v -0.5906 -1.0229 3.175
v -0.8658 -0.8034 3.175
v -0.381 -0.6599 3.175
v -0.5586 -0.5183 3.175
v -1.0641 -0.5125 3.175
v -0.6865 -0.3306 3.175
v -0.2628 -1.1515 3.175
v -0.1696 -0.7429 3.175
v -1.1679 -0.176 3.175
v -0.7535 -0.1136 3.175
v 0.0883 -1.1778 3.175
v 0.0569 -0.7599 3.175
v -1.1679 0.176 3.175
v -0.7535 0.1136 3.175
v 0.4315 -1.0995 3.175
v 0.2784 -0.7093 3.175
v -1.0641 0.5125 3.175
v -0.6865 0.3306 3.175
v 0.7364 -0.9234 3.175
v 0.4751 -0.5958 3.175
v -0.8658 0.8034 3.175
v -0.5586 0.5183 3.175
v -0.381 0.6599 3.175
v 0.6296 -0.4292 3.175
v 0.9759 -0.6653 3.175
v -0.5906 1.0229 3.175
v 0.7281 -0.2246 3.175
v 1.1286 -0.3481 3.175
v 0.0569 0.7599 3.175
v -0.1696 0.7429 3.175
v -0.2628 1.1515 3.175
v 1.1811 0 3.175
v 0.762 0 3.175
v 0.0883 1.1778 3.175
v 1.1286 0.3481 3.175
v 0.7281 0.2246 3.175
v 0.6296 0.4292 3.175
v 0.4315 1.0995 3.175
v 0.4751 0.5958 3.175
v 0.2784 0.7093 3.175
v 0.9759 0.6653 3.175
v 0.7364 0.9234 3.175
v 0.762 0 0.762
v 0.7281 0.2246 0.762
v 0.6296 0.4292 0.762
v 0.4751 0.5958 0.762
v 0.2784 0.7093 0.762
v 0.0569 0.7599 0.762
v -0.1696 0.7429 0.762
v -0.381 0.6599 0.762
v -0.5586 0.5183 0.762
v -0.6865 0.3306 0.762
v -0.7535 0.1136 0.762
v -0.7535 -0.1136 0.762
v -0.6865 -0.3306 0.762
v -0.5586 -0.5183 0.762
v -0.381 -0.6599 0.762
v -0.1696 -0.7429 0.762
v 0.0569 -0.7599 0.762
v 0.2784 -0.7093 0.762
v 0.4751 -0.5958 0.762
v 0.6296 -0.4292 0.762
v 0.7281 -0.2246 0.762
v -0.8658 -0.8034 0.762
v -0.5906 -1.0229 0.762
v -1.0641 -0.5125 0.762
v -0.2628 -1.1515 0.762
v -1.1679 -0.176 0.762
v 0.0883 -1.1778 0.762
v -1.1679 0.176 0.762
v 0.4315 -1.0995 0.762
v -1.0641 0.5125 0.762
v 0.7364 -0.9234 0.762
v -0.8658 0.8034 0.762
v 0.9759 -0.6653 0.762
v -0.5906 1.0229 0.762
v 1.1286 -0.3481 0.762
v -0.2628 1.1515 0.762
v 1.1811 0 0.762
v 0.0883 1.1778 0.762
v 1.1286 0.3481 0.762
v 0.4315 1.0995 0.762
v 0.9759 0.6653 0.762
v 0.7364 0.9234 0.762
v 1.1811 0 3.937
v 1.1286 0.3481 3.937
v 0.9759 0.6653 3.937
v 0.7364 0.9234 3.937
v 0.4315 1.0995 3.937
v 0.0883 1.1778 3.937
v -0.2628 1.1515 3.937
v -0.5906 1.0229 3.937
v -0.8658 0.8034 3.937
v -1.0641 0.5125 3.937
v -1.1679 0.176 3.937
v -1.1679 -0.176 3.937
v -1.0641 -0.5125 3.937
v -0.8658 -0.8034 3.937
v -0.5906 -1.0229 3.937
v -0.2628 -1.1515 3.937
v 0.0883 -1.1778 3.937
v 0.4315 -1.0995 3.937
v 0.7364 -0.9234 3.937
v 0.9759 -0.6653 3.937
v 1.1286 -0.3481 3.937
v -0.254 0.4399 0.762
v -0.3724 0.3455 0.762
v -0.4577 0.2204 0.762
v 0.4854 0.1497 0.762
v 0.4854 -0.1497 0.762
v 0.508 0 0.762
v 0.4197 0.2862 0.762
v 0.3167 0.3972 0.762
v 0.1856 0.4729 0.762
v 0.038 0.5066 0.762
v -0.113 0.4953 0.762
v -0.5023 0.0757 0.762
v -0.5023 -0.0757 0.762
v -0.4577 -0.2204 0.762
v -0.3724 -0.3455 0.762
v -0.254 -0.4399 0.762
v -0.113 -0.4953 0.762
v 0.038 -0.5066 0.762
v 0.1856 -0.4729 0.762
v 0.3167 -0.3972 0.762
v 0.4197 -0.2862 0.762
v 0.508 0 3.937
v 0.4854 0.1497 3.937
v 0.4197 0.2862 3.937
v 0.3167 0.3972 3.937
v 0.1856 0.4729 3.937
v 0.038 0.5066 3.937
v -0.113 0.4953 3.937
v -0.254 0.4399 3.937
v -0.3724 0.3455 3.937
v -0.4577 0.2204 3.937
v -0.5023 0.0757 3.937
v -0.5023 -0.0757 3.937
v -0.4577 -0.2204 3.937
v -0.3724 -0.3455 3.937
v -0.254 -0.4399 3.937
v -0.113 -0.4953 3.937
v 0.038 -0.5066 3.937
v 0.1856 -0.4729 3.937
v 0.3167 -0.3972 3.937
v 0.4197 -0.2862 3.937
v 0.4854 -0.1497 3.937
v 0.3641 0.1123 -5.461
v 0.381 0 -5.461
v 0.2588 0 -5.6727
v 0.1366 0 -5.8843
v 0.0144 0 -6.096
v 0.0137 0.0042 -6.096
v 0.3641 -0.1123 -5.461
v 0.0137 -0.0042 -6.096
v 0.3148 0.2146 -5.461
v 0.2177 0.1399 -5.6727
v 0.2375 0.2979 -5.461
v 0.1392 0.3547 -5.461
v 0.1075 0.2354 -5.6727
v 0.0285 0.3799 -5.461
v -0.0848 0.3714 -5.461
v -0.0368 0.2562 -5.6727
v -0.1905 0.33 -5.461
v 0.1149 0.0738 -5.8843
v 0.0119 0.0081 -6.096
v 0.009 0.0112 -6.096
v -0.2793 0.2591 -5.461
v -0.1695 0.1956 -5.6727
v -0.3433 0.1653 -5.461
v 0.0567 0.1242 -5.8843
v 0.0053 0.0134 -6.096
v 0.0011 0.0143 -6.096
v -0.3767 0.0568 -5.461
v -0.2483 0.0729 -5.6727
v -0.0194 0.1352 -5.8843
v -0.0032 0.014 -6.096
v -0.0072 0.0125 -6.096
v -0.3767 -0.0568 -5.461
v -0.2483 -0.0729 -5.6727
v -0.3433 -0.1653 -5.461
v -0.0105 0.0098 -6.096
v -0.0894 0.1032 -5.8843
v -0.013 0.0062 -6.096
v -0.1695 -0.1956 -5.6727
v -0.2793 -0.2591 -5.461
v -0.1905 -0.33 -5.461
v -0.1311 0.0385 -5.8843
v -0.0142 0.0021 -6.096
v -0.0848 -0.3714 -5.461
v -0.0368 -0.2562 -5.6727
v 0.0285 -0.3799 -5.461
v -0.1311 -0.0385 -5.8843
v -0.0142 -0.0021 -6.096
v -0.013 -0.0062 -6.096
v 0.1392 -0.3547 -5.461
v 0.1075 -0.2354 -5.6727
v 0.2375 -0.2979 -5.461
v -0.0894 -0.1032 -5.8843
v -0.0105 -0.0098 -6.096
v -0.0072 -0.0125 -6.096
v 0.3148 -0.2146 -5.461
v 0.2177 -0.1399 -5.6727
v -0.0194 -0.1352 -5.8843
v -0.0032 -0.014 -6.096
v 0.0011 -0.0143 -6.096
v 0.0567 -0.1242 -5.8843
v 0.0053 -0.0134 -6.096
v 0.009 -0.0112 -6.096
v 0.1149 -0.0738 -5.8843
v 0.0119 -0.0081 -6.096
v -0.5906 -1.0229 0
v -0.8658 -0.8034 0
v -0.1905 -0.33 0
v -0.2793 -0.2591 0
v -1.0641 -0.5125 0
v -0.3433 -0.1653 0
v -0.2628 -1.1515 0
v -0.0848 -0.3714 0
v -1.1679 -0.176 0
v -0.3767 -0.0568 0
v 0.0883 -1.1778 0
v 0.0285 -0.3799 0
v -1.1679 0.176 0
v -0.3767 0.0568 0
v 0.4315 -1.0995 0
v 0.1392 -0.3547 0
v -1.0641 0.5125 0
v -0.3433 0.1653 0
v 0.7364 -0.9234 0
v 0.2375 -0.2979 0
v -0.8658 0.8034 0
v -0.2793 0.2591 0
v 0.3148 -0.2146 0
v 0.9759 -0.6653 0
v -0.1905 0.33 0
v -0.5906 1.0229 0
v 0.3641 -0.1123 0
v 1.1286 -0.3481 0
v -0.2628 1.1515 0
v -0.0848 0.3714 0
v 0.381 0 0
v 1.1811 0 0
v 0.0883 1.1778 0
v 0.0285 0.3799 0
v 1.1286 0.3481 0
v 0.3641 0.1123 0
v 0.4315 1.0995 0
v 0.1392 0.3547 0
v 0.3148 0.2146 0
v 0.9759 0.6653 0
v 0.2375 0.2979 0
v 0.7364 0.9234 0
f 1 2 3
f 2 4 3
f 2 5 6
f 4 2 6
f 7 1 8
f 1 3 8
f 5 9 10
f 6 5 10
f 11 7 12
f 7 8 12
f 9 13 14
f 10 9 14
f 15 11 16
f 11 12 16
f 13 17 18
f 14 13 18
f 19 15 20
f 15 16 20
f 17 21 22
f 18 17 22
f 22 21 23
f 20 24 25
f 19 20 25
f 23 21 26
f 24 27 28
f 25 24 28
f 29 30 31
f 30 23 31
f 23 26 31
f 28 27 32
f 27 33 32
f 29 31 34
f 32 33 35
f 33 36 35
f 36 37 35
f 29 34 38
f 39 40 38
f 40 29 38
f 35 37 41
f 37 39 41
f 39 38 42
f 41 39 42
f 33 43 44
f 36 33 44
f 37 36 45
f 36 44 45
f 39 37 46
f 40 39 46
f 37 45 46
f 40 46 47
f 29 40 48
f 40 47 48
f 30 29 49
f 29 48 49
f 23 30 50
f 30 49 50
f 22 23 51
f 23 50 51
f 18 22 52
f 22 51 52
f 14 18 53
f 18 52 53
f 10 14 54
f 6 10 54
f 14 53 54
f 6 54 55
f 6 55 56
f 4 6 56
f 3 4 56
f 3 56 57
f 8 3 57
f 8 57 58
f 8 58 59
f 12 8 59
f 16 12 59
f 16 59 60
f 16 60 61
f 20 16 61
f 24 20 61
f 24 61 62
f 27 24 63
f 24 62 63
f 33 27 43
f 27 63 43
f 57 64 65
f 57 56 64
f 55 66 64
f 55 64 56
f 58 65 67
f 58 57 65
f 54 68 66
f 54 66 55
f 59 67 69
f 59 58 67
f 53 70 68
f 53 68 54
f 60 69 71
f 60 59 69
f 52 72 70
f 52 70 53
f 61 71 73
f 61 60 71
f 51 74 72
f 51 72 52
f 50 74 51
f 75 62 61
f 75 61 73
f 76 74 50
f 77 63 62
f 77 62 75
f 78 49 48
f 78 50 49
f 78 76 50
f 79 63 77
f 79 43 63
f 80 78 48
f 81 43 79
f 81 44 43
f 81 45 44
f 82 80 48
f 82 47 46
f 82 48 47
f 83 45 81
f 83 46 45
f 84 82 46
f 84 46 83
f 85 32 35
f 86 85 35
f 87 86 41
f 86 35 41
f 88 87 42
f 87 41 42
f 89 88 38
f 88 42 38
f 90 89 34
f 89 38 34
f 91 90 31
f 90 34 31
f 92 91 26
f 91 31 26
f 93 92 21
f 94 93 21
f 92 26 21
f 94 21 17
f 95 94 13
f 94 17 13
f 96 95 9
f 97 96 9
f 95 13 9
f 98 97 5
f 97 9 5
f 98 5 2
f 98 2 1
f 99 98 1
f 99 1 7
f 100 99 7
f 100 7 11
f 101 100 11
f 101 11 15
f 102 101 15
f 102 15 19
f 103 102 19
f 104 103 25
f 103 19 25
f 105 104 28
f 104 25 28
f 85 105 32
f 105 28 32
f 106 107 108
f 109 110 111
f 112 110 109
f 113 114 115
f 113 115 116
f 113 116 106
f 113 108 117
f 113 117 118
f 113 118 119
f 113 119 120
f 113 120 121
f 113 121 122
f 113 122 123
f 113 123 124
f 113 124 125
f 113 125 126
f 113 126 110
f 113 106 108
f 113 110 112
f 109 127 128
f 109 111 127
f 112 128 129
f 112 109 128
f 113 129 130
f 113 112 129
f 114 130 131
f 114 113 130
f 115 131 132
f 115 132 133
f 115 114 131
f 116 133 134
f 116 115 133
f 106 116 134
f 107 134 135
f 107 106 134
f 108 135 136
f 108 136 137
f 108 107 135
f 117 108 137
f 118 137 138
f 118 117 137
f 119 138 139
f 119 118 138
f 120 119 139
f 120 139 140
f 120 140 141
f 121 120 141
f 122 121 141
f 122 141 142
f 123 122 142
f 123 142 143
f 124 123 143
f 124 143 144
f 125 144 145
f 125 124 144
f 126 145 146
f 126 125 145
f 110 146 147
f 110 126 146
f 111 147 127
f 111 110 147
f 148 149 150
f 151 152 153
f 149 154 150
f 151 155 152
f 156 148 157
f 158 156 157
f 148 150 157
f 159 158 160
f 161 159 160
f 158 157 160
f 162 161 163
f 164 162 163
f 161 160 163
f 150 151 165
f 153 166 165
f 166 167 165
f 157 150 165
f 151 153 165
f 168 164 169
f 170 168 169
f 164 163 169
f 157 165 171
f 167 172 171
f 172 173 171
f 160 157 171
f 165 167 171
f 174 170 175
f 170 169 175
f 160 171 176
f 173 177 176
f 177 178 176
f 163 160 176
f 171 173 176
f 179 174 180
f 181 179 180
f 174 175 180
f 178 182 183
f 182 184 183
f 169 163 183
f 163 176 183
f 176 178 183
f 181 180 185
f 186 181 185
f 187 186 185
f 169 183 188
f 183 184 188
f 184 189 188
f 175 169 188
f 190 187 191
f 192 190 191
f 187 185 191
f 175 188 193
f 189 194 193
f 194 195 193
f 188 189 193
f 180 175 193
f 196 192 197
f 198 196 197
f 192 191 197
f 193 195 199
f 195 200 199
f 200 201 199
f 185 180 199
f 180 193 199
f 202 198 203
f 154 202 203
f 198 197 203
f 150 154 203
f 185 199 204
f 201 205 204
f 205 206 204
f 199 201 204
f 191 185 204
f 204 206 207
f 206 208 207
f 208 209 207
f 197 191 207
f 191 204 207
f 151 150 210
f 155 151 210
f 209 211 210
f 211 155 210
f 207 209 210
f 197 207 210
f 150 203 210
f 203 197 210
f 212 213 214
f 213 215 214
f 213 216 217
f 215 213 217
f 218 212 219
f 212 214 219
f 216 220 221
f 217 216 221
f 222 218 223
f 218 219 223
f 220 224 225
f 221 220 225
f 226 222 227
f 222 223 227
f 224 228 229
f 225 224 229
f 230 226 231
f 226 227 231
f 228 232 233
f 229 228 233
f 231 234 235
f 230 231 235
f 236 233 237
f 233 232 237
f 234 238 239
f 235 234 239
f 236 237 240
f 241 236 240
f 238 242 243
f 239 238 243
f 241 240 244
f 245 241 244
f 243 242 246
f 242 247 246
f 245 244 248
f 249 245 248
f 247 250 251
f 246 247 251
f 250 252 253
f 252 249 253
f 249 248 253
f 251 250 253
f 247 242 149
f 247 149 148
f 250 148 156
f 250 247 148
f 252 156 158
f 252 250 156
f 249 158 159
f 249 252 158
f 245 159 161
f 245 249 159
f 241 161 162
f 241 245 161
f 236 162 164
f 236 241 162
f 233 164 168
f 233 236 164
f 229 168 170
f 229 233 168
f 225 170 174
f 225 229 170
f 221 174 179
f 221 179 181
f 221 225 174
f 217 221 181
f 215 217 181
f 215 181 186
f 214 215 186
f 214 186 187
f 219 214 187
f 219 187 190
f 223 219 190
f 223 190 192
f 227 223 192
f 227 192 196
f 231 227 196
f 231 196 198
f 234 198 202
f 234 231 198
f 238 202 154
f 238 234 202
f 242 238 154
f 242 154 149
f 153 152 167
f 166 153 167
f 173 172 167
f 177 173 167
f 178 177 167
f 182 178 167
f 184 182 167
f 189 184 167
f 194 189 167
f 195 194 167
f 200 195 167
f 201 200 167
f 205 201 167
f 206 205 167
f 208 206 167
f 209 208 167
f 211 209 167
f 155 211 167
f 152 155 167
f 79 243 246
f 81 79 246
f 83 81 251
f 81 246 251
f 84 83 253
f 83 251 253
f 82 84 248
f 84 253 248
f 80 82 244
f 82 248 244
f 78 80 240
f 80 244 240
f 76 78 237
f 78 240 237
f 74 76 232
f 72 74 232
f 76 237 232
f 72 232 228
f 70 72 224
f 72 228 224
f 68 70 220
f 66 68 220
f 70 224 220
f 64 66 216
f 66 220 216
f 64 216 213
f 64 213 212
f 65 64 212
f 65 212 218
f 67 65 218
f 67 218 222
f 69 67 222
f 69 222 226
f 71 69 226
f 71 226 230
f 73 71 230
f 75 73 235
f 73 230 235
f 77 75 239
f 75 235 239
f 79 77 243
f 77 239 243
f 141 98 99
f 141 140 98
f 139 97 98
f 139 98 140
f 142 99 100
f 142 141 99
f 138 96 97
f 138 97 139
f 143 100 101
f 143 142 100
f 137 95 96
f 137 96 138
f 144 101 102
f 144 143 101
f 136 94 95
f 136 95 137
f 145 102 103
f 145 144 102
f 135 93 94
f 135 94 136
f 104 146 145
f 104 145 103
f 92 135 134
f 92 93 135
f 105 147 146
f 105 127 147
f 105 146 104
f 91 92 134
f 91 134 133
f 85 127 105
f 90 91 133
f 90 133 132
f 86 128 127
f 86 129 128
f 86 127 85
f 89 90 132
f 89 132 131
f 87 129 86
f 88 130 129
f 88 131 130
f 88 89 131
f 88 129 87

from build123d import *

# Parameters (mm, degrees)
F0_R      = 0.381
F1_DEPTH  = 6.096
F2_SIZE2  = 0.3666174209
F2_SIZE   = 0.635
F0_R_2    = 1.1811
F1_FACE_R = 0.381
F3_DEPTH  = 0.762
F4_R      = 0.762
F4_R_2    = 0.508
F5_DEPTH  = 2.413
F6_R      = 1.1811
F6_R_2    = 0.762
F6_R_3    = 0.508
F7_DEPTH  = 0.762


with BuildPart() as f1:
    # F0 (on Top) → F1 (new body)
    with BuildSketch(Plane.XY):
        Circle(F0_R)
    extrude(amount=-F1_DEPTH)

    # F2
    f2_edges = [f1.edges().sort_by_distance(p)[0] for p in [
        (-0.381, 0, -6.096),
    ]]
    f2_side = f1.faces().sort_by_distance((-0.381, 0, -3.048))[0]
    chamfer(f2_edges, length=F2_SIZE, length2=F2_SIZE2, reference=f2_side)

    # F0 (on Top) + F1_face (on face) → F3 (join)
    with BuildSketch(Plane.XY):
        Circle(F0_R_2)
        Circle(F0_R, mode=Mode.SUBTRACT)
    with BuildSketch(Plane.XY):
        Circle(F1_FACE_R)
    extrude(amount=F3_DEPTH)

    # F4 (on face) → F5 (join)
    with BuildSketch(Plane.XY.offset(0.762)):
        Circle(F4_R)
        Circle(F4_R_2, mode=Mode.SUBTRACT)
    extrude(amount=F5_DEPTH)

    # F6 (on face) → F7 (join)
    with BuildSketch(Plane.XY.offset(3.175)):
        Circle(F6_R)
        Circle(F6_R_2, mode=Mode.SUBTRACT)
        Circle(F6_R_2)
        Circle(F6_R_3, mode=Mode.SUBTRACT)
    extrude(amount=F7_DEPTH)


solid = f1.part
